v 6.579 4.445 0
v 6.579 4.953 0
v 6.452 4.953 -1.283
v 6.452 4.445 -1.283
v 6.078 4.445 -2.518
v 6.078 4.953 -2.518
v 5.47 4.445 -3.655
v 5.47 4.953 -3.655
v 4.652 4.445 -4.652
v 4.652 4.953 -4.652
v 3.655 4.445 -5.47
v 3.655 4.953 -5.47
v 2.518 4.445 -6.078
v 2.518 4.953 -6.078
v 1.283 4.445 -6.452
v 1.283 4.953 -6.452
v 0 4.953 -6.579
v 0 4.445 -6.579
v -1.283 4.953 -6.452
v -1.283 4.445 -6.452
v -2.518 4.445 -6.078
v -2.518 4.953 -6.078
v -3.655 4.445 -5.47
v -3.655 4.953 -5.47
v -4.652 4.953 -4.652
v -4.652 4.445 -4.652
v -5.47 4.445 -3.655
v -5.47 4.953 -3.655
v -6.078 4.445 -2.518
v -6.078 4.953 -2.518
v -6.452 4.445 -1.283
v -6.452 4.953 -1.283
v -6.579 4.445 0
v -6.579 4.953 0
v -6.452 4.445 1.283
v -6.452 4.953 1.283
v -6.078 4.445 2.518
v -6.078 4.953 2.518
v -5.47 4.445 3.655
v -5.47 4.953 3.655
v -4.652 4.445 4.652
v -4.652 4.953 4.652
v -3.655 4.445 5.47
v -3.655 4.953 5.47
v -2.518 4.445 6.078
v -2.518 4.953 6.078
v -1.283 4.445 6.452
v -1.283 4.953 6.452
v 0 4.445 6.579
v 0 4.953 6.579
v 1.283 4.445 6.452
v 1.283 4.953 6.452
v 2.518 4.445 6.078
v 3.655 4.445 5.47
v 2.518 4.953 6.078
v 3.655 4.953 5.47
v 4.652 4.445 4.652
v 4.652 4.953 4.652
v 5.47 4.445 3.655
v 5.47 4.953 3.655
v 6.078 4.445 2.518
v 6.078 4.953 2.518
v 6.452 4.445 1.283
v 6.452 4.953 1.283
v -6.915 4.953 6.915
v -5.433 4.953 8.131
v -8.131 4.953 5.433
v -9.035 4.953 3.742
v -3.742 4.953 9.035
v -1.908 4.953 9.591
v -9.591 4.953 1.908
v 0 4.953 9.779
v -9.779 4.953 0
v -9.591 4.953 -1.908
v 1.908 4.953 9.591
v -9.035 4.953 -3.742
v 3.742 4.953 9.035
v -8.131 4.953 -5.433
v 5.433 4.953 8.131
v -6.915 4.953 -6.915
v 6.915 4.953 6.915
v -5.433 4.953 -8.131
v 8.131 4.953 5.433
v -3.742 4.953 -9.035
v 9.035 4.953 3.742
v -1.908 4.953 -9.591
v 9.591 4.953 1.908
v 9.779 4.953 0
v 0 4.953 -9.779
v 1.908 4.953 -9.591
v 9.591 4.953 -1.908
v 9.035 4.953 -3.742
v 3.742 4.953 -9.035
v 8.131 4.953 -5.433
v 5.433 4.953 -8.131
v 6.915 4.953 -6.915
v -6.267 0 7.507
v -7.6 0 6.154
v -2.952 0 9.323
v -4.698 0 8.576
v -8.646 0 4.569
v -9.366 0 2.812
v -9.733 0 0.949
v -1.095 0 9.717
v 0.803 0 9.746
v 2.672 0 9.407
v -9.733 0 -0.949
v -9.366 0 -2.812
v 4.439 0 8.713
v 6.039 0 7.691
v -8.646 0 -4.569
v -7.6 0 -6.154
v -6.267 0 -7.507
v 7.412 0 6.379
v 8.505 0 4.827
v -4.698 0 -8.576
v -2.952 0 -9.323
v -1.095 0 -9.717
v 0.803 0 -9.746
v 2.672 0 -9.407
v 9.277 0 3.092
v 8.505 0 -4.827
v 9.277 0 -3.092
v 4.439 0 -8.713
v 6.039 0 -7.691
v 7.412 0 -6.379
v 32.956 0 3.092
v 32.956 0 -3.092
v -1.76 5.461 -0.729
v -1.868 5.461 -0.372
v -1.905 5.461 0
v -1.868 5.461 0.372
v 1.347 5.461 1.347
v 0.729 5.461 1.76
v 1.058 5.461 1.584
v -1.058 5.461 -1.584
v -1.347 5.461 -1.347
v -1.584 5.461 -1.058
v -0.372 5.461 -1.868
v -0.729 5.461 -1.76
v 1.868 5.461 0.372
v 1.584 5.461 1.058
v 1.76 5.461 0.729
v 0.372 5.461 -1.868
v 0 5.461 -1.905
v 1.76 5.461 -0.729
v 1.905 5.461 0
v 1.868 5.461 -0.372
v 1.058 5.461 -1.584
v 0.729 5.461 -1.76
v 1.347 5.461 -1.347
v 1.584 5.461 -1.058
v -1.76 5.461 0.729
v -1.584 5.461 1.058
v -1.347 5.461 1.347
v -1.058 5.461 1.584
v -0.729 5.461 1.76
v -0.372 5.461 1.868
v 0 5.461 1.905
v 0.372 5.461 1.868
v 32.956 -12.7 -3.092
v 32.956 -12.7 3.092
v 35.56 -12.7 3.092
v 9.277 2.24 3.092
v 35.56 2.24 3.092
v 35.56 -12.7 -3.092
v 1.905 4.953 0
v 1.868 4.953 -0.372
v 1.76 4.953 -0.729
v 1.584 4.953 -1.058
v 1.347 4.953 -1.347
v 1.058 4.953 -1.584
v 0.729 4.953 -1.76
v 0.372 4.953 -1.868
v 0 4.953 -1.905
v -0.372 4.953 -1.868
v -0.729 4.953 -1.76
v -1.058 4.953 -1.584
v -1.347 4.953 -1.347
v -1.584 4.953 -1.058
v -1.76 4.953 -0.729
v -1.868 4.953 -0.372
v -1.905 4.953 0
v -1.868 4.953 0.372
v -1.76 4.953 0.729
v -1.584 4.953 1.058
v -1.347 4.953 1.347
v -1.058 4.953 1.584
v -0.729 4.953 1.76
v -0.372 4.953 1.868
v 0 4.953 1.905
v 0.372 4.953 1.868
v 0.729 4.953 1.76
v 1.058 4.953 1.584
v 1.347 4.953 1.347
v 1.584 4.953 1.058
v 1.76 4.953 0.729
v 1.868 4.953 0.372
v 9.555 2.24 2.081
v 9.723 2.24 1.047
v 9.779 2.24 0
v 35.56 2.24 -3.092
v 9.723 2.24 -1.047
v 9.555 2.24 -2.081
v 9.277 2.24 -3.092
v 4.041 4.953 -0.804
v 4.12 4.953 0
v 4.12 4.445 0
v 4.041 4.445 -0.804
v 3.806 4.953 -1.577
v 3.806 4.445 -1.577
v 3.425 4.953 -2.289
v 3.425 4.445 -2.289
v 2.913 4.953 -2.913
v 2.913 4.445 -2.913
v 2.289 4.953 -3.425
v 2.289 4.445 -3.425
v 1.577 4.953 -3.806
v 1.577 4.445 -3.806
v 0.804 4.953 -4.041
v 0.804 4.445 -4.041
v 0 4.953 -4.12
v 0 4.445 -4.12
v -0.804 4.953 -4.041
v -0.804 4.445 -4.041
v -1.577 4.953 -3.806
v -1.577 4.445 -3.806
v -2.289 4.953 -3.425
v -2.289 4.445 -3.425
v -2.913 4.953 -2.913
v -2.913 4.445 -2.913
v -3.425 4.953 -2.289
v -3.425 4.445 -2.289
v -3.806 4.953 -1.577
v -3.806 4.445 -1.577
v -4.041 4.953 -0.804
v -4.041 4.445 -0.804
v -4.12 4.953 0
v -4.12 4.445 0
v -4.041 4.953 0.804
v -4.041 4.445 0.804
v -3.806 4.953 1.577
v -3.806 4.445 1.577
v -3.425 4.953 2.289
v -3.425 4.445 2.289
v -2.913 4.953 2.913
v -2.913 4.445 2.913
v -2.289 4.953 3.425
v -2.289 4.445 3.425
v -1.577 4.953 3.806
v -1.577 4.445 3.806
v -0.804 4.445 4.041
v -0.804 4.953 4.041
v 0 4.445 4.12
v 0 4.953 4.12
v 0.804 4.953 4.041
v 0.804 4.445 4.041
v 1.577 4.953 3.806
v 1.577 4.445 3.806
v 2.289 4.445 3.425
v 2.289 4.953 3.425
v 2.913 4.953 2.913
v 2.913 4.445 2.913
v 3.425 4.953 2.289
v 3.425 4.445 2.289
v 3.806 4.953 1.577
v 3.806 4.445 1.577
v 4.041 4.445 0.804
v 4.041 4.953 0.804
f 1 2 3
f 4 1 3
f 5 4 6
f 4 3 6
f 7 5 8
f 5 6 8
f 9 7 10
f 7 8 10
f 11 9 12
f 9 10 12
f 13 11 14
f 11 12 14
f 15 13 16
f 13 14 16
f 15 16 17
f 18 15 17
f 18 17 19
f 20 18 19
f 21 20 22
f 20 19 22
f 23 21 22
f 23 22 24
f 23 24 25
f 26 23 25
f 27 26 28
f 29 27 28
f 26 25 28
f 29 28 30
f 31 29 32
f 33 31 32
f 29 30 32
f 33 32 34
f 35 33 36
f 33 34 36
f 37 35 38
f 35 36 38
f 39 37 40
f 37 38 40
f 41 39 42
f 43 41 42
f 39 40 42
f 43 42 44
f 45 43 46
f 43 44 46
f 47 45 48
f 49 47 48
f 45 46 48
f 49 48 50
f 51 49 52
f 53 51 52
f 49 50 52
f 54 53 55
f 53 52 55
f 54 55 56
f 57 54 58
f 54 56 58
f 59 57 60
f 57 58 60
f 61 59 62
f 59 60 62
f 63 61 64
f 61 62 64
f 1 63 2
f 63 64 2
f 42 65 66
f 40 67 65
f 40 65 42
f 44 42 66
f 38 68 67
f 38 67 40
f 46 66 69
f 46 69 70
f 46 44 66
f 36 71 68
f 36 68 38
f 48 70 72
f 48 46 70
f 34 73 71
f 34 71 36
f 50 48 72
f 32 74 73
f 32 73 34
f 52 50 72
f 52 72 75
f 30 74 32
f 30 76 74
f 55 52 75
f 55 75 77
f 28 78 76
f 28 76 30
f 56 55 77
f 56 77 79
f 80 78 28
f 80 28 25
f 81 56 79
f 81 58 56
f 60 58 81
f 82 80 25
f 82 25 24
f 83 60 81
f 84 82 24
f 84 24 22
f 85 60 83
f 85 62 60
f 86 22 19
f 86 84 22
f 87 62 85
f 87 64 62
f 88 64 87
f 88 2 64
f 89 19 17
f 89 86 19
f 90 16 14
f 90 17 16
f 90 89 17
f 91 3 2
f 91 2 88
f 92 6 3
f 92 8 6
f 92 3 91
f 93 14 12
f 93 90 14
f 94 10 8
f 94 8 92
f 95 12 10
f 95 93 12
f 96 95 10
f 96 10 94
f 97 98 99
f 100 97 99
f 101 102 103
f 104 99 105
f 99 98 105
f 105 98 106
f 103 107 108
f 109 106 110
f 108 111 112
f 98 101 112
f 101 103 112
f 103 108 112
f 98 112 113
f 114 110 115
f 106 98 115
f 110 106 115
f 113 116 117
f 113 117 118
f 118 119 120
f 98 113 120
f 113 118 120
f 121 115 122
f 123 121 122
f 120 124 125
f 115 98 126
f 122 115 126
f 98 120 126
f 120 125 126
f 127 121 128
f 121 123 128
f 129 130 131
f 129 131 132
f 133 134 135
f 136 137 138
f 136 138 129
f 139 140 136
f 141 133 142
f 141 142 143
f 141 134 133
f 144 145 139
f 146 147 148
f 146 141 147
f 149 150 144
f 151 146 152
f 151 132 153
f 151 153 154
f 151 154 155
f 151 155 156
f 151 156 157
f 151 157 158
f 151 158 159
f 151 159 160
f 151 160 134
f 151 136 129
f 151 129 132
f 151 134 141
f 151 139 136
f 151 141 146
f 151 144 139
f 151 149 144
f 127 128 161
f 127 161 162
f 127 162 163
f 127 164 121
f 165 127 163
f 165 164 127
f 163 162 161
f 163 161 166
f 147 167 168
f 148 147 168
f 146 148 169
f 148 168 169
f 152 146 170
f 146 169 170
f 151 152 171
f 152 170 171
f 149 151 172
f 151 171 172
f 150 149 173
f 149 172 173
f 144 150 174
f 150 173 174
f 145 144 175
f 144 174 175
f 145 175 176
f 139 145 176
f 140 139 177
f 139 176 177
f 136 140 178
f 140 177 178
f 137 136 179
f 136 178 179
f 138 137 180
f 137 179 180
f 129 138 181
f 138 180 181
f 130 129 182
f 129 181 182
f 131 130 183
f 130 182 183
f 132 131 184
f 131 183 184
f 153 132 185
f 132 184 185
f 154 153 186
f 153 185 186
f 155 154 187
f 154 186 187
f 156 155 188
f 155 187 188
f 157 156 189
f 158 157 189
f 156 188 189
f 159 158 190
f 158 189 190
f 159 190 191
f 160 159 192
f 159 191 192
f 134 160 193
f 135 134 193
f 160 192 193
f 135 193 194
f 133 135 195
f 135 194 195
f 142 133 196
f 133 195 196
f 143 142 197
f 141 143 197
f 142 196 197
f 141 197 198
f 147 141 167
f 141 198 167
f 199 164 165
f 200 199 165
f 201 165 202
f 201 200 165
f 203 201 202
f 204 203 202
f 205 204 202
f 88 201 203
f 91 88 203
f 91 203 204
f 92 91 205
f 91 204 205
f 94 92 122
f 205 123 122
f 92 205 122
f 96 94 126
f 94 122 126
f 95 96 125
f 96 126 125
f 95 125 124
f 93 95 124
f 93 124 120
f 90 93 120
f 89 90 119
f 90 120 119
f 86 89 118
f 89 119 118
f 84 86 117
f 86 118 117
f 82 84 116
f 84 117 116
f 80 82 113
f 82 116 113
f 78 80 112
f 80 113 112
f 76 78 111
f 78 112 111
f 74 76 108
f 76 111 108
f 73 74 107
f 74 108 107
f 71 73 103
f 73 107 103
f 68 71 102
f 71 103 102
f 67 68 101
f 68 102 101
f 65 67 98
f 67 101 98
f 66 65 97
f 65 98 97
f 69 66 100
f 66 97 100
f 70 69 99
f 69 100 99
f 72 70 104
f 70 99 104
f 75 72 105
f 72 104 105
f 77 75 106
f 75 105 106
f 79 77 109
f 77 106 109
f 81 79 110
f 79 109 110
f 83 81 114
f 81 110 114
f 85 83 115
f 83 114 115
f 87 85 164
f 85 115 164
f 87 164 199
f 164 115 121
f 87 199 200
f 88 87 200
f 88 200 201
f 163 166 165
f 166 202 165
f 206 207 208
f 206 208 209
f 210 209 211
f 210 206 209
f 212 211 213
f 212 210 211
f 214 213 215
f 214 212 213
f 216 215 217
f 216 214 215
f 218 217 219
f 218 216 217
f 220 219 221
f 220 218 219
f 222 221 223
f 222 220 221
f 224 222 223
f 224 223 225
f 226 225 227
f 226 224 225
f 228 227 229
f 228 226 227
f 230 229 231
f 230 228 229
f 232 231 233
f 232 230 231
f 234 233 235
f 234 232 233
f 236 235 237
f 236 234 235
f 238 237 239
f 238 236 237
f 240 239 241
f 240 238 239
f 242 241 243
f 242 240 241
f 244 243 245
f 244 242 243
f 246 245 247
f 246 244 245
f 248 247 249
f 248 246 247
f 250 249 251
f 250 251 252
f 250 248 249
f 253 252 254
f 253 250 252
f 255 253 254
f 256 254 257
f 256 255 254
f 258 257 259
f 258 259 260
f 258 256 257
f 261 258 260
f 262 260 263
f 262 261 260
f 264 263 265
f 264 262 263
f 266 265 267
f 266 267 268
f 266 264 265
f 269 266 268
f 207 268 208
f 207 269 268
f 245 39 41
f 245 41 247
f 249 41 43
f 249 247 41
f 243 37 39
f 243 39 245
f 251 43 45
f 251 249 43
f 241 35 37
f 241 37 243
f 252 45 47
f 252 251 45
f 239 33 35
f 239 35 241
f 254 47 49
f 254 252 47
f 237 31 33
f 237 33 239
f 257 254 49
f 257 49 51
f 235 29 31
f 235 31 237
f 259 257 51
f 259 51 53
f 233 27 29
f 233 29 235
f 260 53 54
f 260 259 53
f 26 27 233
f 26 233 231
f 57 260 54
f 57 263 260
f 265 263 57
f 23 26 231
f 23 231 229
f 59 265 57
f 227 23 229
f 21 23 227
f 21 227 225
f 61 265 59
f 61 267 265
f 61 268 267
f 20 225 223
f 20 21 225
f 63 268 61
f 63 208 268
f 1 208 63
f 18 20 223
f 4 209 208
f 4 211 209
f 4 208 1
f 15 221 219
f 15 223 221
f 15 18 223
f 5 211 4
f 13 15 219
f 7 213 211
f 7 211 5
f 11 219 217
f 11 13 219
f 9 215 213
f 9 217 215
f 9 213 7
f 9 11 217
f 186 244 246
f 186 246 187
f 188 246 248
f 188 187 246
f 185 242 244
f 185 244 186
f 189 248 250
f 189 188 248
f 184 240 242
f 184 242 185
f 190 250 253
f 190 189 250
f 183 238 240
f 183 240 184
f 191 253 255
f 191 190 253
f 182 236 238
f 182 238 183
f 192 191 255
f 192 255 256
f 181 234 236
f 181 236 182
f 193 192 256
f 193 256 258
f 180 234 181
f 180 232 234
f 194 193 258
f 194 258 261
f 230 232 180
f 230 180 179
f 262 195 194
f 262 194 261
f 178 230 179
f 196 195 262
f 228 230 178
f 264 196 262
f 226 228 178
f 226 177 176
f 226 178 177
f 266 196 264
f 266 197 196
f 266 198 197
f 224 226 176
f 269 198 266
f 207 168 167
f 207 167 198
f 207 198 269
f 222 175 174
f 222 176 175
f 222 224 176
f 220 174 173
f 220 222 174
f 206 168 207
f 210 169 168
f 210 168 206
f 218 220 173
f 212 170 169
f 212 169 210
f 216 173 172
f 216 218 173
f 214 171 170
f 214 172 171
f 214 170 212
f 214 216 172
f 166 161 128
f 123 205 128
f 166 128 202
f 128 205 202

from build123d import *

# Parameters (mm, degrees)
SKETCH1_R           = 9.779
BOSS_EXTRUDE1_DEPTH = 4.953
SKETCH2_R           = 1.905
BOSS_EXTRUDE2_DEPTH = 0.508
SKETCH3_R           = 6.578574276
SKETCH3_R_2         = 4.119665811
CUT_EXTRUDE1_DEPTH  = 0.508
SKETCH4_W           = 6.183927722
SKETCH4_H           = 2.240204311
BOSS_EXTRUDE3_DEPTH = 35.56
SKETCH5_W           = 2.60391419
SKETCH5_H           = 6.183927722
BOSS_EXTRUDE4_DEPTH = 12.7


with BuildPart() as part:
    # Sketch1 → Boss-Extrude1 (new body)
    with BuildSketch(Plane(origin=(0, 0, 0), x_dir=(1, 0, 0), z_dir=(0, 1, 0))):
        Circle(SKETCH1_R)
    extrude(amount=BOSS_EXTRUDE1_DEPTH)

    # Sketch2 → Boss-Extrude2 (add)
    with BuildSketch(Plane(origin=(0, 4.953, 0), x_dir=(1, 0, 0), z_dir=(0, 1, 0))):
        Circle(SKETCH2_R)
    extrude(amount=BOSS_EXTRUDE2_DEPTH)

    # Sketch3 → Cut-Extrude1 (cut)
    with BuildSketch(Plane(origin=(0, 4.953, 0), x_dir=(1, 0, 0), z_dir=(0, 1, 0))):
        Circle(SKETCH3_R)
        Circle(SKETCH3_R_2, mode=Mode.SUBTRACT)
    extrude(amount=-CUT_EXTRUDE1_DEPTH, mode=Mode.SUBTRACT)

    # Sketch4 → Boss-Extrude3 (add)
    with BuildSketch(Plane(origin=(0, 0, 0), x_dir=(0, 0, -1), z_dir=(1, 0, 0))):
        with Locations((0, 1.120102156)):
            Rectangle(SKETCH4_W, SKETCH4_H)
    extrude(amount=BOSS_EXTRUDE3_DEPTH)

    # Sketch5 → Boss-Extrude4 (add)
    with BuildSketch(Plane.XZ):
        with Locations((34.258042905, 0)):
            Rectangle(SKETCH5_W, SKETCH5_H)
    extrude(amount=BOSS_EXTRUDE4_DEPTH)


solid = part.part
